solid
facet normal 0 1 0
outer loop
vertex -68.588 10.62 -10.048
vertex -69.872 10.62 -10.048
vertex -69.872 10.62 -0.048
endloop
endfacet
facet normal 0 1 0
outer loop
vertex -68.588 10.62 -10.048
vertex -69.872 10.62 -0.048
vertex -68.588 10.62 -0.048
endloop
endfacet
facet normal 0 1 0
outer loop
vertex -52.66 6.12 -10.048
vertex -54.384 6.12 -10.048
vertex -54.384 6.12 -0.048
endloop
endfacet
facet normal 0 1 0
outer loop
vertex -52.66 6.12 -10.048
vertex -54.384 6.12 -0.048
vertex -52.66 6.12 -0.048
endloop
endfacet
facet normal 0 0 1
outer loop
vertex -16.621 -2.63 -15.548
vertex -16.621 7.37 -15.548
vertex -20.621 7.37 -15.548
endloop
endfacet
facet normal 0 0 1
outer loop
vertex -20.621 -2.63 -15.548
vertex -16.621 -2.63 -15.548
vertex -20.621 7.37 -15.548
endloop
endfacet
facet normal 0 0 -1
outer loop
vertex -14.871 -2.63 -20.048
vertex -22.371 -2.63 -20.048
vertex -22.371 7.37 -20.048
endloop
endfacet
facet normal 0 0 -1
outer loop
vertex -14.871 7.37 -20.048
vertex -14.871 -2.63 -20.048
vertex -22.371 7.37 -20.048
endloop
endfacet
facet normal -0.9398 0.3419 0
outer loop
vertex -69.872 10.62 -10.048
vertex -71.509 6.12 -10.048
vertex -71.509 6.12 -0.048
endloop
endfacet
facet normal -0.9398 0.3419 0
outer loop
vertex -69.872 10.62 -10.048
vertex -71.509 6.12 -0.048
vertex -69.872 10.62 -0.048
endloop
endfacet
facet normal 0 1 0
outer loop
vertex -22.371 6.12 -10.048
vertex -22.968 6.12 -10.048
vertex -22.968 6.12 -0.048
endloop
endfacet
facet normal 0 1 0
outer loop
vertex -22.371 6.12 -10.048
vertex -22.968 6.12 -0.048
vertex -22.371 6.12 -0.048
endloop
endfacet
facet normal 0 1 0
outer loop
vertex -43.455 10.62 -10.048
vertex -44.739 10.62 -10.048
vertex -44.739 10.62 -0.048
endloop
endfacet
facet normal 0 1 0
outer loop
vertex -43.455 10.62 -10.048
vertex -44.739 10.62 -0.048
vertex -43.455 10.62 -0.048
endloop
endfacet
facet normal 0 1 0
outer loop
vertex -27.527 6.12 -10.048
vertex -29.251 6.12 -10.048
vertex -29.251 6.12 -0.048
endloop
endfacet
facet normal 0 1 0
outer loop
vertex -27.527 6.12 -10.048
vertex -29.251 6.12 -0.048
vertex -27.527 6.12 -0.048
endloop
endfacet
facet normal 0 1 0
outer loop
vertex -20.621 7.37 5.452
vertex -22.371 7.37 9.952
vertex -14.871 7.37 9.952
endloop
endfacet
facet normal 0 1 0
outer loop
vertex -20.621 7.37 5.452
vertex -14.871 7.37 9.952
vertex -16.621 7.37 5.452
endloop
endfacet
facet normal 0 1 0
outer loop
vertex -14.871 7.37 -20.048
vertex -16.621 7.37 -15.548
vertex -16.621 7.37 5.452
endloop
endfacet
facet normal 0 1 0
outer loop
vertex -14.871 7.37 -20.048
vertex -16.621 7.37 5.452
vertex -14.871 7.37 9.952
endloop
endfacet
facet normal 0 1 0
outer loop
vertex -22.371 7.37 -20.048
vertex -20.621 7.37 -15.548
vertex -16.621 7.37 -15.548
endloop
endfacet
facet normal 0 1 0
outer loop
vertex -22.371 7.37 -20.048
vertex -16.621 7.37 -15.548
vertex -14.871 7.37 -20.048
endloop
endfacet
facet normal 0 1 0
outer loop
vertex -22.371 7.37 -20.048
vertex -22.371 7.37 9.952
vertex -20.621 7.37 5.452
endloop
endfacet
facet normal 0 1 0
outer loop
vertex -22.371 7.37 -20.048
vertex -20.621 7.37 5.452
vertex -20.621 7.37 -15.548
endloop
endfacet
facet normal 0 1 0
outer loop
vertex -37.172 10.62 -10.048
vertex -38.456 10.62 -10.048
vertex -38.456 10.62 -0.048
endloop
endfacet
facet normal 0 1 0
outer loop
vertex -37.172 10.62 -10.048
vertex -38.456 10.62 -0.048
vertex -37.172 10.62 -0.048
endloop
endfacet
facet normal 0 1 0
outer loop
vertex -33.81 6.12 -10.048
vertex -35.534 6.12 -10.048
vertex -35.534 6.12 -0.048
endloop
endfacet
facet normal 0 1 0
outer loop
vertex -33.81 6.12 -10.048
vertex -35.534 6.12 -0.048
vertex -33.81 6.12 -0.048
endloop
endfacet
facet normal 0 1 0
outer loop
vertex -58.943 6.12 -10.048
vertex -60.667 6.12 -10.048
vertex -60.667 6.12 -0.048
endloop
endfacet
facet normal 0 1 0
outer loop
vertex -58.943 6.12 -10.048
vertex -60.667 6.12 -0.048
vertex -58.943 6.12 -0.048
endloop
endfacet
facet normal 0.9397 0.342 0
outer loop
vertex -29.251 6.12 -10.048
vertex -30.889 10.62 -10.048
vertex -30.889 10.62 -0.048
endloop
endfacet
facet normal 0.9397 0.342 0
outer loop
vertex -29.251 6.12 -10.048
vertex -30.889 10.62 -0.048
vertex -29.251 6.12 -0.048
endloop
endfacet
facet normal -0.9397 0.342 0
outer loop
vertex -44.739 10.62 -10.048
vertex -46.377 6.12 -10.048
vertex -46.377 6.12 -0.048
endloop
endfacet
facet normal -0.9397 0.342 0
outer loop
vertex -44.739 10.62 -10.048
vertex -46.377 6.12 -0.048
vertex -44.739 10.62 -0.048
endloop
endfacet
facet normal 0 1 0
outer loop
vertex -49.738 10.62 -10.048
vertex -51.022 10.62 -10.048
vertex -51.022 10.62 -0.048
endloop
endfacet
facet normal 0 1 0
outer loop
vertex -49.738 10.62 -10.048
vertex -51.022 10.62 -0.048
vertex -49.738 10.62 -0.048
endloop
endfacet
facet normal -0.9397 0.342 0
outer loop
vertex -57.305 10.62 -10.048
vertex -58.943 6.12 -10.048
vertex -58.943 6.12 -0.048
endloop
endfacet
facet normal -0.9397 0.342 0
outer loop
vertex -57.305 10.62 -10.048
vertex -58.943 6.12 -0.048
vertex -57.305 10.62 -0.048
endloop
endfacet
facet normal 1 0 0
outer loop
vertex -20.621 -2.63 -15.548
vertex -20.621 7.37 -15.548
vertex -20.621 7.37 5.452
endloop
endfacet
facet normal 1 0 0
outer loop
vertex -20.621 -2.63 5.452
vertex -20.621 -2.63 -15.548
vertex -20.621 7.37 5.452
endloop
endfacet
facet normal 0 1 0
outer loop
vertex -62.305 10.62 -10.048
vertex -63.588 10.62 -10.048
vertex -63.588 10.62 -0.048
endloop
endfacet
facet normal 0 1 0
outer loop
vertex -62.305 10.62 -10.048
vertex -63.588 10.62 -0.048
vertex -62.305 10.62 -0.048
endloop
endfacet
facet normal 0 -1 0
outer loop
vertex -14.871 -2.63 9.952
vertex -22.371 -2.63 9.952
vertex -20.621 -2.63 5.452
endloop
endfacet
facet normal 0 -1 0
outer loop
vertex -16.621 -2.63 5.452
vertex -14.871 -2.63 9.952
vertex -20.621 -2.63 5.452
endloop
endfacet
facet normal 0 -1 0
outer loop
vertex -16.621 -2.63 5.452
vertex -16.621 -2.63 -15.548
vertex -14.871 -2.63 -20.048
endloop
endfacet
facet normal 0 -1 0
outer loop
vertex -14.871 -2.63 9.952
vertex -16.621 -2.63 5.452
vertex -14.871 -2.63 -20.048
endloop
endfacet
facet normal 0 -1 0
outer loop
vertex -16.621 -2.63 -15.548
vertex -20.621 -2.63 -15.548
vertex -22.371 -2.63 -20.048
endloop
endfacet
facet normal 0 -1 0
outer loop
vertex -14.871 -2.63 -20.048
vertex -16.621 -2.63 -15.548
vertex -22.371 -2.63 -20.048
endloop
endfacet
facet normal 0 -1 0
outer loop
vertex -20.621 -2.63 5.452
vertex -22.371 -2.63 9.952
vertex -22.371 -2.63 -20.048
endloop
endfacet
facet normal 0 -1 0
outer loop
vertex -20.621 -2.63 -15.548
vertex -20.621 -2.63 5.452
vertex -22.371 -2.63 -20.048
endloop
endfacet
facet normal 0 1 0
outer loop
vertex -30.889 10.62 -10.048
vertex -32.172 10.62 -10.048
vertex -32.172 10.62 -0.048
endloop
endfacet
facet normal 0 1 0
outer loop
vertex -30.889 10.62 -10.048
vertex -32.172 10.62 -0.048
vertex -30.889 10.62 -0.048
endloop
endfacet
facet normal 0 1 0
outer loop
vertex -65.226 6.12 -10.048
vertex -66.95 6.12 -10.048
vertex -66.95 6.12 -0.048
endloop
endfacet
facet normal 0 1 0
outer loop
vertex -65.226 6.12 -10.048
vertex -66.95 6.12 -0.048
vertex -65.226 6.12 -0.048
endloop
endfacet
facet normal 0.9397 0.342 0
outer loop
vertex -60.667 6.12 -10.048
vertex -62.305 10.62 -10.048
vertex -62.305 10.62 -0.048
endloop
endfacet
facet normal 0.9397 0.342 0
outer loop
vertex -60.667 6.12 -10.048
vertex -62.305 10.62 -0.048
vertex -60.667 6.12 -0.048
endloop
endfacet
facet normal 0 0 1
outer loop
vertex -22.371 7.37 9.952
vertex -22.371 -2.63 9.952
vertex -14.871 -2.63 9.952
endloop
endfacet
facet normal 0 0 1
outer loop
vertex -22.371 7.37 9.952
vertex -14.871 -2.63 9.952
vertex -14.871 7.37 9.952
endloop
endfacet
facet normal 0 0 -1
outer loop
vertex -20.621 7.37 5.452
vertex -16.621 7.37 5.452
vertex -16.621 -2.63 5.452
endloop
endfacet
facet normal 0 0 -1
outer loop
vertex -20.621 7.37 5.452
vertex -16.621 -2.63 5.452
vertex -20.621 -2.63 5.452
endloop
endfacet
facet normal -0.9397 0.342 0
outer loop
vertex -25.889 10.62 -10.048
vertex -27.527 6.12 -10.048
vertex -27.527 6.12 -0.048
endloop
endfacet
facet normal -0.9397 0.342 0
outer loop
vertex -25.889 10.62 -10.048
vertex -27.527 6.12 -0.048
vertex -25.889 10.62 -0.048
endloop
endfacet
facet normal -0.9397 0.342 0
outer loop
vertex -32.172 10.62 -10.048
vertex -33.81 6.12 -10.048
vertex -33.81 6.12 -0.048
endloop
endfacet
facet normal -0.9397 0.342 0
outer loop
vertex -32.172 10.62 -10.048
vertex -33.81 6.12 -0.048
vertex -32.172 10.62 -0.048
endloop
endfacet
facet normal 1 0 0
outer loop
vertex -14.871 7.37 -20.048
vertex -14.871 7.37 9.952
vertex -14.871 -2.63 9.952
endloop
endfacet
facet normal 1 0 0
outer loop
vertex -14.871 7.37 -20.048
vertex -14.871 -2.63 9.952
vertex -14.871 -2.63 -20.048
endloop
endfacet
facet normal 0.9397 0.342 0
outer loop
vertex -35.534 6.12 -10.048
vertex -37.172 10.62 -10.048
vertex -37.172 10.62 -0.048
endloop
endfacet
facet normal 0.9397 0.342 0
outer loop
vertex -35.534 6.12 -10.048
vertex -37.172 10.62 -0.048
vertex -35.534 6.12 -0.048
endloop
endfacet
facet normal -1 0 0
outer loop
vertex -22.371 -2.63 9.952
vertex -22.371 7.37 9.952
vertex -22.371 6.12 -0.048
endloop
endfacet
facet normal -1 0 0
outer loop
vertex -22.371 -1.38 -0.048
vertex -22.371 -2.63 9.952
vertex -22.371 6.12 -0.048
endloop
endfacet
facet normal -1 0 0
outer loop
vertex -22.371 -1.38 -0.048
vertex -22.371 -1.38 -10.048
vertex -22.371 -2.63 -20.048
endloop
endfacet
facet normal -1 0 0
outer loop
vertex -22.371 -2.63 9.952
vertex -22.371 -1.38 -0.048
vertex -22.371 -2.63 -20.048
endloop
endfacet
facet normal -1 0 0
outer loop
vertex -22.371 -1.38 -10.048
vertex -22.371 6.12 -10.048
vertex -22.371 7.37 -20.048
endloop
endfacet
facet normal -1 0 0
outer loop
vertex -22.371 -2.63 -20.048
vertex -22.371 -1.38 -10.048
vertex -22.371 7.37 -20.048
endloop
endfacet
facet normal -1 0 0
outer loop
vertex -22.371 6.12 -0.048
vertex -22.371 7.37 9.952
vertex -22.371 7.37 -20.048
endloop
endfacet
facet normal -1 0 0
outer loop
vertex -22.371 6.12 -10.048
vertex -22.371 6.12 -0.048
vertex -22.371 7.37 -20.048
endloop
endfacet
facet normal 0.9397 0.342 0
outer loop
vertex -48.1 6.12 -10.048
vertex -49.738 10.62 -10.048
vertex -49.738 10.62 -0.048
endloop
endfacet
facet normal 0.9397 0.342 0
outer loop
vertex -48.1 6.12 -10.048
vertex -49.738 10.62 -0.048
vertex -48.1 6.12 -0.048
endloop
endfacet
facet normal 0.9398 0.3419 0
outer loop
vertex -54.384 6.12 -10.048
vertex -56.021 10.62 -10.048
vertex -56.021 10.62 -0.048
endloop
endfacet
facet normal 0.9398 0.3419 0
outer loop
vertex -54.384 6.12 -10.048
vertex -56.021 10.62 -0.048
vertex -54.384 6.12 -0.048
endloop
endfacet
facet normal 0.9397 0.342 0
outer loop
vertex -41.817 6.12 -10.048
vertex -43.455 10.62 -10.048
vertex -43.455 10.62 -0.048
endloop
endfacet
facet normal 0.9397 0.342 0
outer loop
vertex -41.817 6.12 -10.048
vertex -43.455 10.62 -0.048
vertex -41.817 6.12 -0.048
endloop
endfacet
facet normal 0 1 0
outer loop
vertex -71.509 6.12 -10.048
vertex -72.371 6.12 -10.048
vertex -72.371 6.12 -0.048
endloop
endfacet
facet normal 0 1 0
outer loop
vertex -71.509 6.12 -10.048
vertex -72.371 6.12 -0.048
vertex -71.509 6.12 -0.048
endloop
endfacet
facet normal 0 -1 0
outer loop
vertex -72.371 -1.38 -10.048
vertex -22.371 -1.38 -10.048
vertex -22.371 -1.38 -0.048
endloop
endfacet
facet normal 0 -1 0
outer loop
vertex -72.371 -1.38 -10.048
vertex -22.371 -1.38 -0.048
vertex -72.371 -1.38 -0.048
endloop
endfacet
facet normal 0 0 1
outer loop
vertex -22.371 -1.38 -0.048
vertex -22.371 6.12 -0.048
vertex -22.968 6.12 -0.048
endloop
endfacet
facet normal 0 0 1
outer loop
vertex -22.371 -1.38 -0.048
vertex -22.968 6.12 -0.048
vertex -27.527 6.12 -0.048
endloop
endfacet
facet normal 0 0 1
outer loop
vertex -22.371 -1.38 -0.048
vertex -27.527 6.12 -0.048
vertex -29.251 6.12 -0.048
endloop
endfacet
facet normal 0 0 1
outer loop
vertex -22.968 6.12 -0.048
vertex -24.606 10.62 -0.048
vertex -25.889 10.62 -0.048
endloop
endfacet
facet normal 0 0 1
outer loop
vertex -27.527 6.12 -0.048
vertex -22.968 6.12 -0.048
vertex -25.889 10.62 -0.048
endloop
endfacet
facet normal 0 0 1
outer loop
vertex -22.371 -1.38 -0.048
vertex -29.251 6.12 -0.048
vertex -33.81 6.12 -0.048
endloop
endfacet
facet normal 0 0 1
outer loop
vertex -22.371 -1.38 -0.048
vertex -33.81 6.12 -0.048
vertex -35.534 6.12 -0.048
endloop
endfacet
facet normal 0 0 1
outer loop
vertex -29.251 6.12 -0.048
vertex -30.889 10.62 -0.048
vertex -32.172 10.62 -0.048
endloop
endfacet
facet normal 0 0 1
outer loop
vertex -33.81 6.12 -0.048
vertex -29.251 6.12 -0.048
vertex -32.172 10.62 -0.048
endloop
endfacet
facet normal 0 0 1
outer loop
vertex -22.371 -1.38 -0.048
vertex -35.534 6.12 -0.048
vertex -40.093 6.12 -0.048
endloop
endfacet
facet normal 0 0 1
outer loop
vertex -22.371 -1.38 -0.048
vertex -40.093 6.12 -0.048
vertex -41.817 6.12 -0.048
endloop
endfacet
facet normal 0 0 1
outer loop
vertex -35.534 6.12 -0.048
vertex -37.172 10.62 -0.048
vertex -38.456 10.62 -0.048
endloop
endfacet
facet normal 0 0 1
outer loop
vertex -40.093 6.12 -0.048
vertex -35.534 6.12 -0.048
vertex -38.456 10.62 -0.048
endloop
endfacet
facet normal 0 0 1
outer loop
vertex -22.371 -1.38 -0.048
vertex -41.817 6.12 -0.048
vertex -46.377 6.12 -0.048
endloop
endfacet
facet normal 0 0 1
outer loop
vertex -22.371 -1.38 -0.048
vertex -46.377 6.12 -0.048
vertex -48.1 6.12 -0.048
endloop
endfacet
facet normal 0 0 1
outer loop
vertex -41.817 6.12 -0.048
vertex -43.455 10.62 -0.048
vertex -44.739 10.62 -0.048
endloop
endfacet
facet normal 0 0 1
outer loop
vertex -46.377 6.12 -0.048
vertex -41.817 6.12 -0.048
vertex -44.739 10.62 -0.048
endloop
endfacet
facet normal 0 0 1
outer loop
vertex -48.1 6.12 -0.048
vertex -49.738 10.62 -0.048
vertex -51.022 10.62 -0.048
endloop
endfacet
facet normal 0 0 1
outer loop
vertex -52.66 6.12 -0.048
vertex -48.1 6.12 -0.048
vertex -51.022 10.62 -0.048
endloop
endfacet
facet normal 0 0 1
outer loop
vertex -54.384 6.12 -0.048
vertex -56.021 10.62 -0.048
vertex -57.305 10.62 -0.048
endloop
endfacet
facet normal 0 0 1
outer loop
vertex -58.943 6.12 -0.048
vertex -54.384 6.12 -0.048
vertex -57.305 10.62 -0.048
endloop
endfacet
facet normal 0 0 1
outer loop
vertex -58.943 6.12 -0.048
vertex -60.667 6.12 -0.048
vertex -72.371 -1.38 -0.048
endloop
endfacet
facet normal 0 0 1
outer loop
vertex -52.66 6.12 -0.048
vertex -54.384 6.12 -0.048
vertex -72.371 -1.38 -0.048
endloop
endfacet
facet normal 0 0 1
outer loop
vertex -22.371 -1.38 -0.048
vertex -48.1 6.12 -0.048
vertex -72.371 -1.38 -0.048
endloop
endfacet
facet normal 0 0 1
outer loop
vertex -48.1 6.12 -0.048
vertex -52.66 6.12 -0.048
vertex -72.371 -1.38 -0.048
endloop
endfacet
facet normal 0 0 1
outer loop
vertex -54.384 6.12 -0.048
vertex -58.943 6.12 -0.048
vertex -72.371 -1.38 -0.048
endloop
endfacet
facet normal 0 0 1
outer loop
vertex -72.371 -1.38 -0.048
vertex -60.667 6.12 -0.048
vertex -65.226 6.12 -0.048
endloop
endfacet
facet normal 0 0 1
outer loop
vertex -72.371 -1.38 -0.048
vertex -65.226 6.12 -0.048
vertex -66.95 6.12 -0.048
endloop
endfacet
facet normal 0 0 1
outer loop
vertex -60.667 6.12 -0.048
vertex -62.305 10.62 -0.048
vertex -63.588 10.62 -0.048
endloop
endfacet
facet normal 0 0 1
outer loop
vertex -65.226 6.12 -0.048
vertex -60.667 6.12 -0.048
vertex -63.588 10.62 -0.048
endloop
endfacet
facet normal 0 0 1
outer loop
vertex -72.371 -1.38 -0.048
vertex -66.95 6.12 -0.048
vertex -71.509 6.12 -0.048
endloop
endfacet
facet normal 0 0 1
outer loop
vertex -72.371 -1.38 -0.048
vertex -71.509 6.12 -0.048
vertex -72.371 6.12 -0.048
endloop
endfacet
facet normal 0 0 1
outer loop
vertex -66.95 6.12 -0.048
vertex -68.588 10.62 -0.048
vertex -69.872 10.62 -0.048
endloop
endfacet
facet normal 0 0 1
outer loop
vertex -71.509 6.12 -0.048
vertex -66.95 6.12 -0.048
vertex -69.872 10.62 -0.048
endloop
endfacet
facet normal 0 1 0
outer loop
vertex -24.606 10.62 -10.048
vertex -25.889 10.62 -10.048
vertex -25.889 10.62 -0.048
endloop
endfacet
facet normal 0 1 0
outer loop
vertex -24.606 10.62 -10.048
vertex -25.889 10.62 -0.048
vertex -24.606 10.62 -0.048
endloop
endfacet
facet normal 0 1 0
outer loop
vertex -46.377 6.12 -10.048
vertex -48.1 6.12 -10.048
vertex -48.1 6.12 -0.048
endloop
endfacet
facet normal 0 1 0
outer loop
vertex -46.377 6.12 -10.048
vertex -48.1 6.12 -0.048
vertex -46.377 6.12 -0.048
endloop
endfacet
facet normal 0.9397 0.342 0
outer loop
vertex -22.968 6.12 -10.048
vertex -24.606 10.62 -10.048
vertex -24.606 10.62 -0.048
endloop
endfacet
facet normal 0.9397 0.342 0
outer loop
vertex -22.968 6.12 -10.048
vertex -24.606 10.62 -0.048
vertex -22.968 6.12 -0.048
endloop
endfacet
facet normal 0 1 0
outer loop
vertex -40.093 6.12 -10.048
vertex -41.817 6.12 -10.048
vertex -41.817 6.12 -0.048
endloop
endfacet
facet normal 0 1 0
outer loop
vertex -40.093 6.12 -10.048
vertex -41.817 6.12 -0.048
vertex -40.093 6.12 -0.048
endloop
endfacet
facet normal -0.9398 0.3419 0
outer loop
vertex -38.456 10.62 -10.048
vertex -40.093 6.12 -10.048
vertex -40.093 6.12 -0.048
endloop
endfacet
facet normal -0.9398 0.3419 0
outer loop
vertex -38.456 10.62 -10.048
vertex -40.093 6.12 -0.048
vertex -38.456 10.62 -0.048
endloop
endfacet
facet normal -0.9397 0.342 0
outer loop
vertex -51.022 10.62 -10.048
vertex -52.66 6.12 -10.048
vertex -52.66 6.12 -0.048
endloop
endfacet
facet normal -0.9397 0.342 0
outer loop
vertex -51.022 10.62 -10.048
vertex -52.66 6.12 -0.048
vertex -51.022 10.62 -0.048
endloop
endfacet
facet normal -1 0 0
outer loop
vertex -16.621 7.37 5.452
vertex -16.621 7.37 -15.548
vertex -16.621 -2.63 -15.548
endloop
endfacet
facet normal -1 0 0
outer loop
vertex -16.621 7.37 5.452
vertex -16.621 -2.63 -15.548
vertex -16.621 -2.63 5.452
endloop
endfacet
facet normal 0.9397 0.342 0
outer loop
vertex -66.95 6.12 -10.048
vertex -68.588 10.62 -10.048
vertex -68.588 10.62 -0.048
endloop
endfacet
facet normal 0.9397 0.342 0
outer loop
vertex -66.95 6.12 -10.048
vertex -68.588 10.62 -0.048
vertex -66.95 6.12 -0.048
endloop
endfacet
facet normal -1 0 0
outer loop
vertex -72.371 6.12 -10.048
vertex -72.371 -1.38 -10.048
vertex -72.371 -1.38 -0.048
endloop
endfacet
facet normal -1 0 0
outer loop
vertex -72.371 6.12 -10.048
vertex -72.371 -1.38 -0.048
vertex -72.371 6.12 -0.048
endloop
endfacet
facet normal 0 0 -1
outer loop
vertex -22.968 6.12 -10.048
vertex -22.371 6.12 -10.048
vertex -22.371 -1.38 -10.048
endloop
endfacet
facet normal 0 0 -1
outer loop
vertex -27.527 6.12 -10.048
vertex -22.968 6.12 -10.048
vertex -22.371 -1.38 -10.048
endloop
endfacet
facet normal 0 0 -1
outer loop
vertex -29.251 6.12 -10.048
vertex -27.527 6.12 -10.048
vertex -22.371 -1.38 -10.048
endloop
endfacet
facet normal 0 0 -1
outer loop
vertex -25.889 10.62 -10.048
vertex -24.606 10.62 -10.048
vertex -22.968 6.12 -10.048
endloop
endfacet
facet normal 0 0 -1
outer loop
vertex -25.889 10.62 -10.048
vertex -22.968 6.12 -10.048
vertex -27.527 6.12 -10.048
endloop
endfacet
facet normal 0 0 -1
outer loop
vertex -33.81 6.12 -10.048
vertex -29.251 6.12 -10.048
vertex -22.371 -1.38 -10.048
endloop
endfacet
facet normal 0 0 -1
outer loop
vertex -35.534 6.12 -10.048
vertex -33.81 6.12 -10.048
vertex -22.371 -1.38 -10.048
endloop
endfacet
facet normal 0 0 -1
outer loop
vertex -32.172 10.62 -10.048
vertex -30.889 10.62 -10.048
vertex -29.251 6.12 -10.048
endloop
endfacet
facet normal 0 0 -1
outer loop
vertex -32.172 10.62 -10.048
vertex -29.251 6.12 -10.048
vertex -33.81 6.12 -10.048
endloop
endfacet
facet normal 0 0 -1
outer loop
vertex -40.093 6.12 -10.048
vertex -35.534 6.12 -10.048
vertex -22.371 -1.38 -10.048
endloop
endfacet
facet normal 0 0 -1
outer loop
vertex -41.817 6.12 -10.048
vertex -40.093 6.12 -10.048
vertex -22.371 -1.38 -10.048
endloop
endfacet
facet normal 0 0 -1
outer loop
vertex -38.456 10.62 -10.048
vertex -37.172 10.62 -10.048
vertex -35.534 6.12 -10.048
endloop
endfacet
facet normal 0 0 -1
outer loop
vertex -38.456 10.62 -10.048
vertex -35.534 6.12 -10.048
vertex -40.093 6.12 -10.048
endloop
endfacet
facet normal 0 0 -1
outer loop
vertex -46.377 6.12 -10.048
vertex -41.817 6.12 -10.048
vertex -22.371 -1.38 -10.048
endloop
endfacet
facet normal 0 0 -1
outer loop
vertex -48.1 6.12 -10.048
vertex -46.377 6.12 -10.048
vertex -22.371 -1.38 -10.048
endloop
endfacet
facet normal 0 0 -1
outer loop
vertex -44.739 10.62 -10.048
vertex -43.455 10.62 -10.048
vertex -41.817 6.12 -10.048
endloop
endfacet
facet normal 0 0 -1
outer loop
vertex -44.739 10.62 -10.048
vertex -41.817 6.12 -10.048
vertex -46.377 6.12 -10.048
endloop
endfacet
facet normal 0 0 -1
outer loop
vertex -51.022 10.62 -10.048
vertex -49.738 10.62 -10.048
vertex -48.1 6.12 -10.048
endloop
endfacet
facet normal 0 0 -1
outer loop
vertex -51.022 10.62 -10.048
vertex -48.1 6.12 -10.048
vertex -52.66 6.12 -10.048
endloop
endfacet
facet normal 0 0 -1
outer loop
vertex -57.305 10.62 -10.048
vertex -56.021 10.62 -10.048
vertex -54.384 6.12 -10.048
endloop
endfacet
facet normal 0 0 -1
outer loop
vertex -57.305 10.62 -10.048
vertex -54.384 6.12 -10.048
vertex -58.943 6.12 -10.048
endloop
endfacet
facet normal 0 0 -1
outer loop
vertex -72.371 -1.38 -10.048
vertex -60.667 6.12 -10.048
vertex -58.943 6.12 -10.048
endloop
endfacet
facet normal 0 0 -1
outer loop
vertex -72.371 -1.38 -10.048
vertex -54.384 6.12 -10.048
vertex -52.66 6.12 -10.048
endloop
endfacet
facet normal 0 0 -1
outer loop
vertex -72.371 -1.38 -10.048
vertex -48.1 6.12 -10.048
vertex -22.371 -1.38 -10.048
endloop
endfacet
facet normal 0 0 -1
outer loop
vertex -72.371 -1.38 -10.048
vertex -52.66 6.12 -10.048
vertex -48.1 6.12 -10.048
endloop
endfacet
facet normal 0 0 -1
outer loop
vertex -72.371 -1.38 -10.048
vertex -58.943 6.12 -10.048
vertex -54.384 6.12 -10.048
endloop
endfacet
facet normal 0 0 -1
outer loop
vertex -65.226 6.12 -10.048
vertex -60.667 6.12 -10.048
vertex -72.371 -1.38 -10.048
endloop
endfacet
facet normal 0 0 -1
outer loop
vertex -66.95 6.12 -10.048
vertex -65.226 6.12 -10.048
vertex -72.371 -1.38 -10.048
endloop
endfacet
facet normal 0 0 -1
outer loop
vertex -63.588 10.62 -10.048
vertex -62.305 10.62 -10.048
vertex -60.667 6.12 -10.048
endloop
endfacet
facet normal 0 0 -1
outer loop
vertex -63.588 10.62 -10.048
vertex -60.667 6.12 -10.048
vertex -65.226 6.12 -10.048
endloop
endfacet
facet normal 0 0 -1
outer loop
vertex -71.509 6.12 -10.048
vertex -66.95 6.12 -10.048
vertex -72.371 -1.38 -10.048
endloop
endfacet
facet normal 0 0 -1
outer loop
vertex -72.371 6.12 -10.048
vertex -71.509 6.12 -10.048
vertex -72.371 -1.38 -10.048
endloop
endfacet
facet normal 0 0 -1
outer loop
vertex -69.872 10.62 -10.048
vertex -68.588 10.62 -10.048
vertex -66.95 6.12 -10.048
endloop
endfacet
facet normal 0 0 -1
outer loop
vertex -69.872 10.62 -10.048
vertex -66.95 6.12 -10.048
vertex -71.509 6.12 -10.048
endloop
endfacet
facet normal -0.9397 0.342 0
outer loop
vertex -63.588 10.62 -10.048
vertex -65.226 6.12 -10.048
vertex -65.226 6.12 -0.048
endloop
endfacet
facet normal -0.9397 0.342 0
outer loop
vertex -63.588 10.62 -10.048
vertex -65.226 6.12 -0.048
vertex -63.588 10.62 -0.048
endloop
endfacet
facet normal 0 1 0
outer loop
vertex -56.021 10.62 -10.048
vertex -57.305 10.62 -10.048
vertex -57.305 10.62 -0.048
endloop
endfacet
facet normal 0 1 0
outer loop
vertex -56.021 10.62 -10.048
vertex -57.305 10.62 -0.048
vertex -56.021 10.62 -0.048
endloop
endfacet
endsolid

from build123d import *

# Parameters (mm, degrees)
BOSS_EXTRUDE1_DEPTH = 10
SKETCH2_W           = 30
SKETCH2_H           = 10
BOSS_EXTRUDE2_DEPTH = 7.5
CUT_EXTRUDE1_REACH  = 12
SKETCH3_W           = 4
SKETCH3_H           = 21


with BuildPart() as part:
    # Sketch1 → Boss-Extrude1 (new body)
    with BuildSketch(Plane(origin=(0, 0, -10.04783639), x_dir=(-1, 0, 0), z_dir=(0, 0, -1))):
        Polygon((24.605530087, 10.619804964), (22.967664033, 6.119804964), (22.371275694, 6.119804964), (22.371275694, -1.380195036), (72.371275694, -1.380195036), (72.371275694, 6.119804964), (71.509404954, 6.119804964), (69.8715389, 10.619804964), (68.587827187, 10.619804964), (66.949961133, 6.119804964), (65.226219654, 6.119804964), (63.5883536, 10.619804964), (62.304641887, 10.619804964), (60.666775833, 6.119804964), (58.943034354, 6.119804964), (57.3051683, 10.619804964), (56.021456587, 10.619804964), (54.383590533, 6.119804964), (52.659849054, 6.119804964), (51.021983, 10.619804964), (49.738271287, 10.619804964), (48.100405233, 6.119804964), (46.376663754, 6.119804964), (44.7387977, 10.619804964), (43.455085987, 10.619804964), (41.817219933, 6.119804964), (40.093478454, 6.119804964), (38.4556124, 10.619804964), (37.171900687, 10.619804964), (35.534034633, 6.119804964), (33.810293154, 6.119804964), (32.1724271, 10.619804964), (30.888715387, 10.619804964), (29.250849333, 6.119804964), (27.527107854, 6.119804964), (25.8892418, 10.619804964), align=None)
    extrude(amount=-BOSS_EXTRUDE1_DEPTH)

    # Sketch2 → Boss-Extrude2 (add)
    with BuildSketch(Plane(origin=(-22.371275694, 0, 0), x_dir=(0, 0, -1), z_dir=(1, 0, 0))):
        with Locations((5.04783639, 2.369804964)):
            Rectangle(SKETCH2_W, SKETCH2_H)
    extrude(amount=BOSS_EXTRUDE2_DEPTH)

    # Sketch3 → Cut-Extrude1 (cut, up to next)
    with BuildSketch(Plane(origin=(0, 7.369804964, 0), x_dir=(-1, 0, 0), z_dir=(0, 1, 0)), mode=Mode.PRIVATE) as cut_extrude1_sk1:
        with Locations((18.621275694, -5.04783639)):
            Rectangle(SKETCH3_W, SKETCH3_H)
    cut_extrude1_tool1 = extrude(cut_extrude1_sk1.sketch, amount=-CUT_EXTRUDE1_REACH, mode=Mode.PRIVATE) & part.part
    add(cut_extrude1_tool1.solids().sort_by_distance((-18.621276, 7.369805, -5.047836))[0], mode=Mode.SUBTRACT)


solid = part.part
